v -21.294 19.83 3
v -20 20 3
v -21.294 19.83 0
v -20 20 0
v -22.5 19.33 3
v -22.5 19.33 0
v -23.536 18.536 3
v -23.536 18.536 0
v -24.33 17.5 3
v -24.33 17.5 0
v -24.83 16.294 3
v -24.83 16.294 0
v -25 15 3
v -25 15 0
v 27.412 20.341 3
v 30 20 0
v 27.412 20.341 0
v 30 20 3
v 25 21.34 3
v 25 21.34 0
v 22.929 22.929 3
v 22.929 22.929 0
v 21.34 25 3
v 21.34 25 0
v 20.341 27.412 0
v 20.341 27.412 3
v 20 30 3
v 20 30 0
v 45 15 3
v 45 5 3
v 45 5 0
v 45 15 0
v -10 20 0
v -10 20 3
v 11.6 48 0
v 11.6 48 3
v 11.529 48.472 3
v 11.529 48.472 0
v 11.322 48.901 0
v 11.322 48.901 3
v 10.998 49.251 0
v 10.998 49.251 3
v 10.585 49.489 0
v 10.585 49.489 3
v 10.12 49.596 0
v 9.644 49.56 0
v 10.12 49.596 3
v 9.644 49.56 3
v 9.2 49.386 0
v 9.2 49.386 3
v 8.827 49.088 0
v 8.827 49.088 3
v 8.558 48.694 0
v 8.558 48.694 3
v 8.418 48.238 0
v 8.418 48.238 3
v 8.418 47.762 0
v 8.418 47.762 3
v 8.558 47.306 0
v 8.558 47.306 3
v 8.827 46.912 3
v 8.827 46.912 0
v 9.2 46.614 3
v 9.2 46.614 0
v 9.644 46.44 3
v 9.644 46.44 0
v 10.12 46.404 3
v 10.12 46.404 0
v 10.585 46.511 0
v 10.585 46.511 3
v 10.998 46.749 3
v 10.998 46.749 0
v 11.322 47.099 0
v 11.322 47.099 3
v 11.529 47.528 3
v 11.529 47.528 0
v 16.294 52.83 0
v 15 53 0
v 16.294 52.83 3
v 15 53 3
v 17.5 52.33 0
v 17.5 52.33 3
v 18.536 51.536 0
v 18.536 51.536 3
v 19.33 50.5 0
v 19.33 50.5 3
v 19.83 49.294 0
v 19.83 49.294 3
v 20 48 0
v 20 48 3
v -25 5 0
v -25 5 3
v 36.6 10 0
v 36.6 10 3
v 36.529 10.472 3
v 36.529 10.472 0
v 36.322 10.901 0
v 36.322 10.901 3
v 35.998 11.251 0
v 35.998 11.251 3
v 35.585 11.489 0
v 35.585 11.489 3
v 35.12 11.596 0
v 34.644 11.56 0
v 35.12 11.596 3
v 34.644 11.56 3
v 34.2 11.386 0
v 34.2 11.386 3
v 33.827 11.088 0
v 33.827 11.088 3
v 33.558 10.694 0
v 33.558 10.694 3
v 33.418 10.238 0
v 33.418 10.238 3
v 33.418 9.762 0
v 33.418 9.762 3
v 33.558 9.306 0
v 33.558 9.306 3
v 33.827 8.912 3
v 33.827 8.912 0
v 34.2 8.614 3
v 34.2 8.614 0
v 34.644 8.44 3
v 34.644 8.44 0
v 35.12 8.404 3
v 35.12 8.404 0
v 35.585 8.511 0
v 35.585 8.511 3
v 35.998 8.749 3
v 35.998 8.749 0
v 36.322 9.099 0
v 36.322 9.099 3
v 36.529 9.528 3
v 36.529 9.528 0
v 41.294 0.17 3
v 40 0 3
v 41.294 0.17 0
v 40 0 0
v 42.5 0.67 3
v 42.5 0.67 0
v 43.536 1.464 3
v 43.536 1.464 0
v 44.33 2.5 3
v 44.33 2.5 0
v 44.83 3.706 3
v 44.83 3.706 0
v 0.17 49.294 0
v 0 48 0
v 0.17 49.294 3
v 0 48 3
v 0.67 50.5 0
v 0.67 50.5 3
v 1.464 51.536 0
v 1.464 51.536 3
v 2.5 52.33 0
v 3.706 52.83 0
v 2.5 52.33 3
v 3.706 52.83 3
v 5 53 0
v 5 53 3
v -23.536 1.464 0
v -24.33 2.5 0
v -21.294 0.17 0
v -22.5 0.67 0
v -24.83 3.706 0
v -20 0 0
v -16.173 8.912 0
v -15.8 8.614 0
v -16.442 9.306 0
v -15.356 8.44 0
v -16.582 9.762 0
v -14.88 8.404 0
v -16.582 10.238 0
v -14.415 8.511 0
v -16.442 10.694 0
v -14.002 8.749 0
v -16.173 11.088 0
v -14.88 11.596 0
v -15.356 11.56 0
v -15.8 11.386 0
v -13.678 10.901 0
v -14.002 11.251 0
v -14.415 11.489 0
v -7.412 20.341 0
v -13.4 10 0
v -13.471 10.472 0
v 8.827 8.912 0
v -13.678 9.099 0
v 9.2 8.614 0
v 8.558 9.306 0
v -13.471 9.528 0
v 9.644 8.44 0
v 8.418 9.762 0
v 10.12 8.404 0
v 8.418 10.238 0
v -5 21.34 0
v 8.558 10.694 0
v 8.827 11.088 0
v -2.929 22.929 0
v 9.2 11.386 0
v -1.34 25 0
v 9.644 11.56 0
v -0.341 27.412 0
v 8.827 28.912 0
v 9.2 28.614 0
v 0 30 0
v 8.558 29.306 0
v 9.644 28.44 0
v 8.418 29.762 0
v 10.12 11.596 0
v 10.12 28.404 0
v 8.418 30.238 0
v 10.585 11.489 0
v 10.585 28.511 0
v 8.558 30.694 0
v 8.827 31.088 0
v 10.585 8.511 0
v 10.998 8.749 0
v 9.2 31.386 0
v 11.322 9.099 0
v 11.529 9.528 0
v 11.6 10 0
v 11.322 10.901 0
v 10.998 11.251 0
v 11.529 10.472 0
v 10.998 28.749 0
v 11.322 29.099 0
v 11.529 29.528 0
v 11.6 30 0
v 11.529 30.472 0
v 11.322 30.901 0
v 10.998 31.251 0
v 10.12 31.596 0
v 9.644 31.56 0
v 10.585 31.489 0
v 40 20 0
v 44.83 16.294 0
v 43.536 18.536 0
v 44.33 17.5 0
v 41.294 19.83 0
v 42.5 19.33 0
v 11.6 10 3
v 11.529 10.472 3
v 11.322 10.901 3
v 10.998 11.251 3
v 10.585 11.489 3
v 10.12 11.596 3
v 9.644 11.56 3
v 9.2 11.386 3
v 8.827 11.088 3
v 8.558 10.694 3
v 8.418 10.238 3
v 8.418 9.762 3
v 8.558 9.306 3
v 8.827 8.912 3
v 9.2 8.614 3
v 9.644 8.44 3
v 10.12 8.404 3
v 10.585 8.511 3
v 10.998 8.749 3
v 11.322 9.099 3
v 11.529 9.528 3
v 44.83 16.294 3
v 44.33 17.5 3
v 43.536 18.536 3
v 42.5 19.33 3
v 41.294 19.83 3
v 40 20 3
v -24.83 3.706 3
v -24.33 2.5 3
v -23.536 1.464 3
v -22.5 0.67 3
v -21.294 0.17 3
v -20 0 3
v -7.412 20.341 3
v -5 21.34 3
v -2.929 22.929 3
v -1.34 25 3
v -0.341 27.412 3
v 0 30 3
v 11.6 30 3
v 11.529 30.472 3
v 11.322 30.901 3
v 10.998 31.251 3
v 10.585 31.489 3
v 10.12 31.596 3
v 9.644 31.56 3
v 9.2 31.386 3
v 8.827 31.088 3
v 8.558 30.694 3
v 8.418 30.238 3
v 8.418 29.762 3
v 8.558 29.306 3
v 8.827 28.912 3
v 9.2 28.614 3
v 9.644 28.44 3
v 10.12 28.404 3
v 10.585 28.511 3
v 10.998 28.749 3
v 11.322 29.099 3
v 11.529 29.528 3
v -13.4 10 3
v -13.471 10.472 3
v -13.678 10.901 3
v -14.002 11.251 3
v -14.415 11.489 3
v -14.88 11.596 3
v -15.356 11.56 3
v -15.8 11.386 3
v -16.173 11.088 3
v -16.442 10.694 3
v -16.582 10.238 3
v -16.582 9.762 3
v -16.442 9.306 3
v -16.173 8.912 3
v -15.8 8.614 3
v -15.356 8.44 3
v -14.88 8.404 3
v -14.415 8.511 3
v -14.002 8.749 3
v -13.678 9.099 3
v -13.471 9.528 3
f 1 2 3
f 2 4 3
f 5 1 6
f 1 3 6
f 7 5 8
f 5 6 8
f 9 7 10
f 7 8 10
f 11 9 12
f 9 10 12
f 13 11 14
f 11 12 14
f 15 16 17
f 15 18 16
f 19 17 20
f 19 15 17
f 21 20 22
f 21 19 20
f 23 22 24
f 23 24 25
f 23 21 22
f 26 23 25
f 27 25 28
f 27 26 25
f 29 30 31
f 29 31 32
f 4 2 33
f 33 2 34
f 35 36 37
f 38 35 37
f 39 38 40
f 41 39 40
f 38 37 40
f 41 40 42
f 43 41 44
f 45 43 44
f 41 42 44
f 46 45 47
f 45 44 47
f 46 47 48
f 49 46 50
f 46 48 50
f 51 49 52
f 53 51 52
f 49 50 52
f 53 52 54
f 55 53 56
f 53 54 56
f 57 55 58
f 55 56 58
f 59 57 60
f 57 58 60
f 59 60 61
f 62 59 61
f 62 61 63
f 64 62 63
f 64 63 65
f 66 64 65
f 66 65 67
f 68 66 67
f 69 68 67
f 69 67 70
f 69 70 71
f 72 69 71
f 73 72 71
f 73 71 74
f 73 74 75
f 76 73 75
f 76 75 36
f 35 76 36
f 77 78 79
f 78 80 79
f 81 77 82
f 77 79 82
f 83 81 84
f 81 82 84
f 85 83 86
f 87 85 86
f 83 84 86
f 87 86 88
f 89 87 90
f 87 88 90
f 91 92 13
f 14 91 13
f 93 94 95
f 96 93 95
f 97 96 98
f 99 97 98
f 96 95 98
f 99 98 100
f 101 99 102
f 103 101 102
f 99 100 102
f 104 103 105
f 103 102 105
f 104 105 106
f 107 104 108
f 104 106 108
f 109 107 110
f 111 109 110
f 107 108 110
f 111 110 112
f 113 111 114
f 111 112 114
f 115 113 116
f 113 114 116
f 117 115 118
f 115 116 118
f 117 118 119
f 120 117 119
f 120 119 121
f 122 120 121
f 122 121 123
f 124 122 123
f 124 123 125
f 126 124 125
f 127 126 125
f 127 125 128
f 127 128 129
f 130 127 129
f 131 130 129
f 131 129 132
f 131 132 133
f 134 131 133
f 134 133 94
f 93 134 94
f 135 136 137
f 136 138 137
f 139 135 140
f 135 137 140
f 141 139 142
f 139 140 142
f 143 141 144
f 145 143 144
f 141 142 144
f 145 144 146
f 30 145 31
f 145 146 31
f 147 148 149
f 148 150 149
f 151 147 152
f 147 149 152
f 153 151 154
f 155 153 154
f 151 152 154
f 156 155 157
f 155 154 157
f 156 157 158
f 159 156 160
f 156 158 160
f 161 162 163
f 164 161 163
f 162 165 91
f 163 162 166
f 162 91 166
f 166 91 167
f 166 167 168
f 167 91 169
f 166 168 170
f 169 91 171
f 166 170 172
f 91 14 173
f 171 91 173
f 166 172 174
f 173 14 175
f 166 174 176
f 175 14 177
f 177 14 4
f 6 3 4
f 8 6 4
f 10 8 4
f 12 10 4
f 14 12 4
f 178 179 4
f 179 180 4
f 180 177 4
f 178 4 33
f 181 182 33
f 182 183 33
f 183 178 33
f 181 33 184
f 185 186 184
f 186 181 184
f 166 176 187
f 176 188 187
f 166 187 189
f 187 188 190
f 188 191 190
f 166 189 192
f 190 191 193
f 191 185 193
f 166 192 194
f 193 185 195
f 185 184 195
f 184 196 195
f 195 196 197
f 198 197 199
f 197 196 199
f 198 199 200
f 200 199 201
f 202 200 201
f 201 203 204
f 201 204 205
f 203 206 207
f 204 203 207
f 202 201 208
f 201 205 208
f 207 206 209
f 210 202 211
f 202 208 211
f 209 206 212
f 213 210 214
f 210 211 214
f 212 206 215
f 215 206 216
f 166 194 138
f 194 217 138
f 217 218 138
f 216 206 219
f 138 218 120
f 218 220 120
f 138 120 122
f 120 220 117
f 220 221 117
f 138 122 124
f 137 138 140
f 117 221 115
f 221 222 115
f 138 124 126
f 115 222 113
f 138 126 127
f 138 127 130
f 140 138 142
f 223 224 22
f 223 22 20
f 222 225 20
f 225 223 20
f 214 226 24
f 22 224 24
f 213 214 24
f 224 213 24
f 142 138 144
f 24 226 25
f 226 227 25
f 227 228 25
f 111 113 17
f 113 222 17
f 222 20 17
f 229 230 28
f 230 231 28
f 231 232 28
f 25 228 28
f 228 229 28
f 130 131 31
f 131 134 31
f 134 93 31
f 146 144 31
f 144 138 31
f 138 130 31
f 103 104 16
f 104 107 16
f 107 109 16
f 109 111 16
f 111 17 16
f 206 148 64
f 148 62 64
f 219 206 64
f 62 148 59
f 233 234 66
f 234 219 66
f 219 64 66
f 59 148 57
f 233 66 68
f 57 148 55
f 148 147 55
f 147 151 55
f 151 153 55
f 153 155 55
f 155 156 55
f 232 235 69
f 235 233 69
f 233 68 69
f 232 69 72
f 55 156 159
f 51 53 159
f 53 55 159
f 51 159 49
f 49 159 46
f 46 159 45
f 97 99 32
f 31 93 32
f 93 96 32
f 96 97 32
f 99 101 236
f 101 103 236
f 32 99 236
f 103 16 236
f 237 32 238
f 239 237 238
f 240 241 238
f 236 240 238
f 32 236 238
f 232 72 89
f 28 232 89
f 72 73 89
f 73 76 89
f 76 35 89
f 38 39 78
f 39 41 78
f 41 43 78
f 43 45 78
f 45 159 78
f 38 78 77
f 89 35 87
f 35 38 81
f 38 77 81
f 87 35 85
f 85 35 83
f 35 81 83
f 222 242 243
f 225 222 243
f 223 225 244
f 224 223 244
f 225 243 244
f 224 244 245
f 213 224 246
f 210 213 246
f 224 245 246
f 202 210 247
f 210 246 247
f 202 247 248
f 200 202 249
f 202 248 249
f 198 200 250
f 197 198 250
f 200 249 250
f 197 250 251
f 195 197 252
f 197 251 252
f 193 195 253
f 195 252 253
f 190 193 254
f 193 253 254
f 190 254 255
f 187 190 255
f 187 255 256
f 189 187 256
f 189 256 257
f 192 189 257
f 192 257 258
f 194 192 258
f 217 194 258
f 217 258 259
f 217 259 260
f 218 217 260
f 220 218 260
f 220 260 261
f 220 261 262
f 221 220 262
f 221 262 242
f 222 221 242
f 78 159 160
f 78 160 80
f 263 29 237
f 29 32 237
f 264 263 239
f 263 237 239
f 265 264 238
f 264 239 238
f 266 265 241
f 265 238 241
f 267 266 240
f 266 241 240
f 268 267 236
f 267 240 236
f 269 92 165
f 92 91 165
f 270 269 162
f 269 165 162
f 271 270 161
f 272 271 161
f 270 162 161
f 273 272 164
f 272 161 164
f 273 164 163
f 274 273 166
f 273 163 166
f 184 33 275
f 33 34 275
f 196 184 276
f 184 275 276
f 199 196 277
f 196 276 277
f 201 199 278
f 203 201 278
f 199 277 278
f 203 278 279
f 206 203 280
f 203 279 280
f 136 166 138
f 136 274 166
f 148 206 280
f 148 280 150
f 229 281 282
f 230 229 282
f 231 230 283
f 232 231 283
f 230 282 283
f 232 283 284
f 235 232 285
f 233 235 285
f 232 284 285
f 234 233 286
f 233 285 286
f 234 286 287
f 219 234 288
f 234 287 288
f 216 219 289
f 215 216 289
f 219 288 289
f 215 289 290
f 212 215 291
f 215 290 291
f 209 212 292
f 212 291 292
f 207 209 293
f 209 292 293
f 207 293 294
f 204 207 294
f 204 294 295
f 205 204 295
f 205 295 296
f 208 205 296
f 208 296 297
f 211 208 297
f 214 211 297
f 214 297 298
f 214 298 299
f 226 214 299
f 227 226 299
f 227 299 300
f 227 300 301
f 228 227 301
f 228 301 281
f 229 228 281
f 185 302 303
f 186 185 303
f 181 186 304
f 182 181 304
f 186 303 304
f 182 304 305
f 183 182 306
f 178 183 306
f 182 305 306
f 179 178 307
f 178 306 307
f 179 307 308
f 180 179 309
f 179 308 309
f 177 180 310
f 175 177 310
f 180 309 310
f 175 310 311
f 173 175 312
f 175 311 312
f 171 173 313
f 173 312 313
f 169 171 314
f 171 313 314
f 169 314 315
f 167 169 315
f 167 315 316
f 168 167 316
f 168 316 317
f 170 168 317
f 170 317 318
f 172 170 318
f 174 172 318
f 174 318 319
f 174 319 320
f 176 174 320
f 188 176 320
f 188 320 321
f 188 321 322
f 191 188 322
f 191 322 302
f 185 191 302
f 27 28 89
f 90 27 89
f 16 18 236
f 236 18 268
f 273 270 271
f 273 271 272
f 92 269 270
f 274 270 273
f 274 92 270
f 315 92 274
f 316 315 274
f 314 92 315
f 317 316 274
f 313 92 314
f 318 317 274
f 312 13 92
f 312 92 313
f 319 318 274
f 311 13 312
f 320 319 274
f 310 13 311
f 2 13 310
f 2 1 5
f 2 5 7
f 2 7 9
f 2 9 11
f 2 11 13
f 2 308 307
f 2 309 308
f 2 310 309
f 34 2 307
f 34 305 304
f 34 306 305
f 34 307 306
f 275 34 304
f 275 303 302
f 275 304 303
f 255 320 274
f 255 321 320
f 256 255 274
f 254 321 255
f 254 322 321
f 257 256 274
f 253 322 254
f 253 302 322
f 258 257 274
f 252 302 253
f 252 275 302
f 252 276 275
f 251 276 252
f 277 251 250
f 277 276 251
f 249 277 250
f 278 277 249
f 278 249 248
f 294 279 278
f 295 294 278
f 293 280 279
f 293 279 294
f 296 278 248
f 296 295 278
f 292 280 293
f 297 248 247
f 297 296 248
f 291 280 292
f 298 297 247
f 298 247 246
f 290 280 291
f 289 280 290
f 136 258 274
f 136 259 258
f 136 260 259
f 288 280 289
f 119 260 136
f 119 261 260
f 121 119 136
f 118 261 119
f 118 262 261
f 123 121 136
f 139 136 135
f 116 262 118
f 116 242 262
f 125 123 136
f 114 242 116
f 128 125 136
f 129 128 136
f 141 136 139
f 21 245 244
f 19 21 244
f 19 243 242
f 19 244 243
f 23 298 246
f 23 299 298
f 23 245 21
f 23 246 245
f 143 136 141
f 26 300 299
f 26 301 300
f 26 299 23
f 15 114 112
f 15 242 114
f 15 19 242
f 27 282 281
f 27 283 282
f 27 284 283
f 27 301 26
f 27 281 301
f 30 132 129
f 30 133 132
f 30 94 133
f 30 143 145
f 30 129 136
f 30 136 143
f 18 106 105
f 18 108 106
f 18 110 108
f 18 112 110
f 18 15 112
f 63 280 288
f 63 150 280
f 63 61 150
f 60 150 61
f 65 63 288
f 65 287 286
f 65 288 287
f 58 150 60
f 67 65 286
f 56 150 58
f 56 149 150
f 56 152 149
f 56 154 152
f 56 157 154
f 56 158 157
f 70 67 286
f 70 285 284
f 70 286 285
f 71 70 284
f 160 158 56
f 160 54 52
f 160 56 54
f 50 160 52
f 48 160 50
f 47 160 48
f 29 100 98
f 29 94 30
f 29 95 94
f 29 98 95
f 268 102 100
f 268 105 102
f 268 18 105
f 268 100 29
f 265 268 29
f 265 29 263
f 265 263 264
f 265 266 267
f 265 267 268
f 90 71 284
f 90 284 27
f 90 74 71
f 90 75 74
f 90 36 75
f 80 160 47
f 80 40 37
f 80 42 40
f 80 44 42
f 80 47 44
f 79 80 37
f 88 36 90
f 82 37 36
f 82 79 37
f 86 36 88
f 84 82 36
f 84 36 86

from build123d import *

# Parameters (mm, degrees)
SKETCH_1_W          = 20
SKETCH_1_H          = 53
EXTRUDE_1_DEPTH     = 3
SKETCH_2_W          = 70
SKETCH_2_H          = 20
EXTRUDE_2_DEPTH     = 3
SKETCH_3_R          = 1.6
CUT_EXTRUDE_1_DEPTH = 70.591666168
FILLET_1_R          = 10
FILLET_2_R          = 5


with BuildPart() as part:
    # 草图1 → 凸台-拉伸1 (new body)
    with BuildSketch(Plane.XY):
        with Locations((10, 26.5)):
            Rectangle(SKETCH_1_W, SKETCH_1_H)
    extrude(amount=EXTRUDE_1_DEPTH)

    # 草图2 → 凸台-拉伸2 (add)
    with BuildSketch(Plane.XY.offset(3)):
        with Locations((10, 10)):
            Rectangle(SKETCH_2_W, SKETCH_2_H)
    extrude(amount=-EXTRUDE_2_DEPTH)

    # 草图3 → 切除-拉伸1 (cut, through all)
    with BuildSketch(Plane.XY.offset(3)):
        with Locations((10, 48)):
            Circle(SKETCH_3_R)
        with Locations((10, 30)):
            Circle(SKETCH_3_R)
        with Locations((10, 10)):
            Circle(SKETCH_3_R)
        with Locations((-15, 10)):
            Circle(SKETCH_3_R)
        with Locations((35, 10)):
            Circle(SKETCH_3_R)
    extrude(amount=-CUT_EXTRUDE_1_DEPTH, mode=Mode.SUBTRACT)

    # 圆角1
    fillet_1_edges = [part.edges().sort_by_distance(p)[0] for p in [
        (0, 20, 1.5),
        (20, 20, 1.5),
    ]]
    fillet(fillet_1_edges, radius=FILLET_1_R)

    # 圆角2
    fillet_2_edges = [part.edges().sort_by_distance(p)[0] for p in [
        (-25, 20, 1.5),
        (45, 0, 1.5),
        (-25, 0, 1.5),
        (45, 20, 1.5),
        (0, 53, 1.5),
        (20, 53, 1.5),
    ]]
    fillet(fillet_2_edges, radius=FILLET_2_R)


solid = part.part
